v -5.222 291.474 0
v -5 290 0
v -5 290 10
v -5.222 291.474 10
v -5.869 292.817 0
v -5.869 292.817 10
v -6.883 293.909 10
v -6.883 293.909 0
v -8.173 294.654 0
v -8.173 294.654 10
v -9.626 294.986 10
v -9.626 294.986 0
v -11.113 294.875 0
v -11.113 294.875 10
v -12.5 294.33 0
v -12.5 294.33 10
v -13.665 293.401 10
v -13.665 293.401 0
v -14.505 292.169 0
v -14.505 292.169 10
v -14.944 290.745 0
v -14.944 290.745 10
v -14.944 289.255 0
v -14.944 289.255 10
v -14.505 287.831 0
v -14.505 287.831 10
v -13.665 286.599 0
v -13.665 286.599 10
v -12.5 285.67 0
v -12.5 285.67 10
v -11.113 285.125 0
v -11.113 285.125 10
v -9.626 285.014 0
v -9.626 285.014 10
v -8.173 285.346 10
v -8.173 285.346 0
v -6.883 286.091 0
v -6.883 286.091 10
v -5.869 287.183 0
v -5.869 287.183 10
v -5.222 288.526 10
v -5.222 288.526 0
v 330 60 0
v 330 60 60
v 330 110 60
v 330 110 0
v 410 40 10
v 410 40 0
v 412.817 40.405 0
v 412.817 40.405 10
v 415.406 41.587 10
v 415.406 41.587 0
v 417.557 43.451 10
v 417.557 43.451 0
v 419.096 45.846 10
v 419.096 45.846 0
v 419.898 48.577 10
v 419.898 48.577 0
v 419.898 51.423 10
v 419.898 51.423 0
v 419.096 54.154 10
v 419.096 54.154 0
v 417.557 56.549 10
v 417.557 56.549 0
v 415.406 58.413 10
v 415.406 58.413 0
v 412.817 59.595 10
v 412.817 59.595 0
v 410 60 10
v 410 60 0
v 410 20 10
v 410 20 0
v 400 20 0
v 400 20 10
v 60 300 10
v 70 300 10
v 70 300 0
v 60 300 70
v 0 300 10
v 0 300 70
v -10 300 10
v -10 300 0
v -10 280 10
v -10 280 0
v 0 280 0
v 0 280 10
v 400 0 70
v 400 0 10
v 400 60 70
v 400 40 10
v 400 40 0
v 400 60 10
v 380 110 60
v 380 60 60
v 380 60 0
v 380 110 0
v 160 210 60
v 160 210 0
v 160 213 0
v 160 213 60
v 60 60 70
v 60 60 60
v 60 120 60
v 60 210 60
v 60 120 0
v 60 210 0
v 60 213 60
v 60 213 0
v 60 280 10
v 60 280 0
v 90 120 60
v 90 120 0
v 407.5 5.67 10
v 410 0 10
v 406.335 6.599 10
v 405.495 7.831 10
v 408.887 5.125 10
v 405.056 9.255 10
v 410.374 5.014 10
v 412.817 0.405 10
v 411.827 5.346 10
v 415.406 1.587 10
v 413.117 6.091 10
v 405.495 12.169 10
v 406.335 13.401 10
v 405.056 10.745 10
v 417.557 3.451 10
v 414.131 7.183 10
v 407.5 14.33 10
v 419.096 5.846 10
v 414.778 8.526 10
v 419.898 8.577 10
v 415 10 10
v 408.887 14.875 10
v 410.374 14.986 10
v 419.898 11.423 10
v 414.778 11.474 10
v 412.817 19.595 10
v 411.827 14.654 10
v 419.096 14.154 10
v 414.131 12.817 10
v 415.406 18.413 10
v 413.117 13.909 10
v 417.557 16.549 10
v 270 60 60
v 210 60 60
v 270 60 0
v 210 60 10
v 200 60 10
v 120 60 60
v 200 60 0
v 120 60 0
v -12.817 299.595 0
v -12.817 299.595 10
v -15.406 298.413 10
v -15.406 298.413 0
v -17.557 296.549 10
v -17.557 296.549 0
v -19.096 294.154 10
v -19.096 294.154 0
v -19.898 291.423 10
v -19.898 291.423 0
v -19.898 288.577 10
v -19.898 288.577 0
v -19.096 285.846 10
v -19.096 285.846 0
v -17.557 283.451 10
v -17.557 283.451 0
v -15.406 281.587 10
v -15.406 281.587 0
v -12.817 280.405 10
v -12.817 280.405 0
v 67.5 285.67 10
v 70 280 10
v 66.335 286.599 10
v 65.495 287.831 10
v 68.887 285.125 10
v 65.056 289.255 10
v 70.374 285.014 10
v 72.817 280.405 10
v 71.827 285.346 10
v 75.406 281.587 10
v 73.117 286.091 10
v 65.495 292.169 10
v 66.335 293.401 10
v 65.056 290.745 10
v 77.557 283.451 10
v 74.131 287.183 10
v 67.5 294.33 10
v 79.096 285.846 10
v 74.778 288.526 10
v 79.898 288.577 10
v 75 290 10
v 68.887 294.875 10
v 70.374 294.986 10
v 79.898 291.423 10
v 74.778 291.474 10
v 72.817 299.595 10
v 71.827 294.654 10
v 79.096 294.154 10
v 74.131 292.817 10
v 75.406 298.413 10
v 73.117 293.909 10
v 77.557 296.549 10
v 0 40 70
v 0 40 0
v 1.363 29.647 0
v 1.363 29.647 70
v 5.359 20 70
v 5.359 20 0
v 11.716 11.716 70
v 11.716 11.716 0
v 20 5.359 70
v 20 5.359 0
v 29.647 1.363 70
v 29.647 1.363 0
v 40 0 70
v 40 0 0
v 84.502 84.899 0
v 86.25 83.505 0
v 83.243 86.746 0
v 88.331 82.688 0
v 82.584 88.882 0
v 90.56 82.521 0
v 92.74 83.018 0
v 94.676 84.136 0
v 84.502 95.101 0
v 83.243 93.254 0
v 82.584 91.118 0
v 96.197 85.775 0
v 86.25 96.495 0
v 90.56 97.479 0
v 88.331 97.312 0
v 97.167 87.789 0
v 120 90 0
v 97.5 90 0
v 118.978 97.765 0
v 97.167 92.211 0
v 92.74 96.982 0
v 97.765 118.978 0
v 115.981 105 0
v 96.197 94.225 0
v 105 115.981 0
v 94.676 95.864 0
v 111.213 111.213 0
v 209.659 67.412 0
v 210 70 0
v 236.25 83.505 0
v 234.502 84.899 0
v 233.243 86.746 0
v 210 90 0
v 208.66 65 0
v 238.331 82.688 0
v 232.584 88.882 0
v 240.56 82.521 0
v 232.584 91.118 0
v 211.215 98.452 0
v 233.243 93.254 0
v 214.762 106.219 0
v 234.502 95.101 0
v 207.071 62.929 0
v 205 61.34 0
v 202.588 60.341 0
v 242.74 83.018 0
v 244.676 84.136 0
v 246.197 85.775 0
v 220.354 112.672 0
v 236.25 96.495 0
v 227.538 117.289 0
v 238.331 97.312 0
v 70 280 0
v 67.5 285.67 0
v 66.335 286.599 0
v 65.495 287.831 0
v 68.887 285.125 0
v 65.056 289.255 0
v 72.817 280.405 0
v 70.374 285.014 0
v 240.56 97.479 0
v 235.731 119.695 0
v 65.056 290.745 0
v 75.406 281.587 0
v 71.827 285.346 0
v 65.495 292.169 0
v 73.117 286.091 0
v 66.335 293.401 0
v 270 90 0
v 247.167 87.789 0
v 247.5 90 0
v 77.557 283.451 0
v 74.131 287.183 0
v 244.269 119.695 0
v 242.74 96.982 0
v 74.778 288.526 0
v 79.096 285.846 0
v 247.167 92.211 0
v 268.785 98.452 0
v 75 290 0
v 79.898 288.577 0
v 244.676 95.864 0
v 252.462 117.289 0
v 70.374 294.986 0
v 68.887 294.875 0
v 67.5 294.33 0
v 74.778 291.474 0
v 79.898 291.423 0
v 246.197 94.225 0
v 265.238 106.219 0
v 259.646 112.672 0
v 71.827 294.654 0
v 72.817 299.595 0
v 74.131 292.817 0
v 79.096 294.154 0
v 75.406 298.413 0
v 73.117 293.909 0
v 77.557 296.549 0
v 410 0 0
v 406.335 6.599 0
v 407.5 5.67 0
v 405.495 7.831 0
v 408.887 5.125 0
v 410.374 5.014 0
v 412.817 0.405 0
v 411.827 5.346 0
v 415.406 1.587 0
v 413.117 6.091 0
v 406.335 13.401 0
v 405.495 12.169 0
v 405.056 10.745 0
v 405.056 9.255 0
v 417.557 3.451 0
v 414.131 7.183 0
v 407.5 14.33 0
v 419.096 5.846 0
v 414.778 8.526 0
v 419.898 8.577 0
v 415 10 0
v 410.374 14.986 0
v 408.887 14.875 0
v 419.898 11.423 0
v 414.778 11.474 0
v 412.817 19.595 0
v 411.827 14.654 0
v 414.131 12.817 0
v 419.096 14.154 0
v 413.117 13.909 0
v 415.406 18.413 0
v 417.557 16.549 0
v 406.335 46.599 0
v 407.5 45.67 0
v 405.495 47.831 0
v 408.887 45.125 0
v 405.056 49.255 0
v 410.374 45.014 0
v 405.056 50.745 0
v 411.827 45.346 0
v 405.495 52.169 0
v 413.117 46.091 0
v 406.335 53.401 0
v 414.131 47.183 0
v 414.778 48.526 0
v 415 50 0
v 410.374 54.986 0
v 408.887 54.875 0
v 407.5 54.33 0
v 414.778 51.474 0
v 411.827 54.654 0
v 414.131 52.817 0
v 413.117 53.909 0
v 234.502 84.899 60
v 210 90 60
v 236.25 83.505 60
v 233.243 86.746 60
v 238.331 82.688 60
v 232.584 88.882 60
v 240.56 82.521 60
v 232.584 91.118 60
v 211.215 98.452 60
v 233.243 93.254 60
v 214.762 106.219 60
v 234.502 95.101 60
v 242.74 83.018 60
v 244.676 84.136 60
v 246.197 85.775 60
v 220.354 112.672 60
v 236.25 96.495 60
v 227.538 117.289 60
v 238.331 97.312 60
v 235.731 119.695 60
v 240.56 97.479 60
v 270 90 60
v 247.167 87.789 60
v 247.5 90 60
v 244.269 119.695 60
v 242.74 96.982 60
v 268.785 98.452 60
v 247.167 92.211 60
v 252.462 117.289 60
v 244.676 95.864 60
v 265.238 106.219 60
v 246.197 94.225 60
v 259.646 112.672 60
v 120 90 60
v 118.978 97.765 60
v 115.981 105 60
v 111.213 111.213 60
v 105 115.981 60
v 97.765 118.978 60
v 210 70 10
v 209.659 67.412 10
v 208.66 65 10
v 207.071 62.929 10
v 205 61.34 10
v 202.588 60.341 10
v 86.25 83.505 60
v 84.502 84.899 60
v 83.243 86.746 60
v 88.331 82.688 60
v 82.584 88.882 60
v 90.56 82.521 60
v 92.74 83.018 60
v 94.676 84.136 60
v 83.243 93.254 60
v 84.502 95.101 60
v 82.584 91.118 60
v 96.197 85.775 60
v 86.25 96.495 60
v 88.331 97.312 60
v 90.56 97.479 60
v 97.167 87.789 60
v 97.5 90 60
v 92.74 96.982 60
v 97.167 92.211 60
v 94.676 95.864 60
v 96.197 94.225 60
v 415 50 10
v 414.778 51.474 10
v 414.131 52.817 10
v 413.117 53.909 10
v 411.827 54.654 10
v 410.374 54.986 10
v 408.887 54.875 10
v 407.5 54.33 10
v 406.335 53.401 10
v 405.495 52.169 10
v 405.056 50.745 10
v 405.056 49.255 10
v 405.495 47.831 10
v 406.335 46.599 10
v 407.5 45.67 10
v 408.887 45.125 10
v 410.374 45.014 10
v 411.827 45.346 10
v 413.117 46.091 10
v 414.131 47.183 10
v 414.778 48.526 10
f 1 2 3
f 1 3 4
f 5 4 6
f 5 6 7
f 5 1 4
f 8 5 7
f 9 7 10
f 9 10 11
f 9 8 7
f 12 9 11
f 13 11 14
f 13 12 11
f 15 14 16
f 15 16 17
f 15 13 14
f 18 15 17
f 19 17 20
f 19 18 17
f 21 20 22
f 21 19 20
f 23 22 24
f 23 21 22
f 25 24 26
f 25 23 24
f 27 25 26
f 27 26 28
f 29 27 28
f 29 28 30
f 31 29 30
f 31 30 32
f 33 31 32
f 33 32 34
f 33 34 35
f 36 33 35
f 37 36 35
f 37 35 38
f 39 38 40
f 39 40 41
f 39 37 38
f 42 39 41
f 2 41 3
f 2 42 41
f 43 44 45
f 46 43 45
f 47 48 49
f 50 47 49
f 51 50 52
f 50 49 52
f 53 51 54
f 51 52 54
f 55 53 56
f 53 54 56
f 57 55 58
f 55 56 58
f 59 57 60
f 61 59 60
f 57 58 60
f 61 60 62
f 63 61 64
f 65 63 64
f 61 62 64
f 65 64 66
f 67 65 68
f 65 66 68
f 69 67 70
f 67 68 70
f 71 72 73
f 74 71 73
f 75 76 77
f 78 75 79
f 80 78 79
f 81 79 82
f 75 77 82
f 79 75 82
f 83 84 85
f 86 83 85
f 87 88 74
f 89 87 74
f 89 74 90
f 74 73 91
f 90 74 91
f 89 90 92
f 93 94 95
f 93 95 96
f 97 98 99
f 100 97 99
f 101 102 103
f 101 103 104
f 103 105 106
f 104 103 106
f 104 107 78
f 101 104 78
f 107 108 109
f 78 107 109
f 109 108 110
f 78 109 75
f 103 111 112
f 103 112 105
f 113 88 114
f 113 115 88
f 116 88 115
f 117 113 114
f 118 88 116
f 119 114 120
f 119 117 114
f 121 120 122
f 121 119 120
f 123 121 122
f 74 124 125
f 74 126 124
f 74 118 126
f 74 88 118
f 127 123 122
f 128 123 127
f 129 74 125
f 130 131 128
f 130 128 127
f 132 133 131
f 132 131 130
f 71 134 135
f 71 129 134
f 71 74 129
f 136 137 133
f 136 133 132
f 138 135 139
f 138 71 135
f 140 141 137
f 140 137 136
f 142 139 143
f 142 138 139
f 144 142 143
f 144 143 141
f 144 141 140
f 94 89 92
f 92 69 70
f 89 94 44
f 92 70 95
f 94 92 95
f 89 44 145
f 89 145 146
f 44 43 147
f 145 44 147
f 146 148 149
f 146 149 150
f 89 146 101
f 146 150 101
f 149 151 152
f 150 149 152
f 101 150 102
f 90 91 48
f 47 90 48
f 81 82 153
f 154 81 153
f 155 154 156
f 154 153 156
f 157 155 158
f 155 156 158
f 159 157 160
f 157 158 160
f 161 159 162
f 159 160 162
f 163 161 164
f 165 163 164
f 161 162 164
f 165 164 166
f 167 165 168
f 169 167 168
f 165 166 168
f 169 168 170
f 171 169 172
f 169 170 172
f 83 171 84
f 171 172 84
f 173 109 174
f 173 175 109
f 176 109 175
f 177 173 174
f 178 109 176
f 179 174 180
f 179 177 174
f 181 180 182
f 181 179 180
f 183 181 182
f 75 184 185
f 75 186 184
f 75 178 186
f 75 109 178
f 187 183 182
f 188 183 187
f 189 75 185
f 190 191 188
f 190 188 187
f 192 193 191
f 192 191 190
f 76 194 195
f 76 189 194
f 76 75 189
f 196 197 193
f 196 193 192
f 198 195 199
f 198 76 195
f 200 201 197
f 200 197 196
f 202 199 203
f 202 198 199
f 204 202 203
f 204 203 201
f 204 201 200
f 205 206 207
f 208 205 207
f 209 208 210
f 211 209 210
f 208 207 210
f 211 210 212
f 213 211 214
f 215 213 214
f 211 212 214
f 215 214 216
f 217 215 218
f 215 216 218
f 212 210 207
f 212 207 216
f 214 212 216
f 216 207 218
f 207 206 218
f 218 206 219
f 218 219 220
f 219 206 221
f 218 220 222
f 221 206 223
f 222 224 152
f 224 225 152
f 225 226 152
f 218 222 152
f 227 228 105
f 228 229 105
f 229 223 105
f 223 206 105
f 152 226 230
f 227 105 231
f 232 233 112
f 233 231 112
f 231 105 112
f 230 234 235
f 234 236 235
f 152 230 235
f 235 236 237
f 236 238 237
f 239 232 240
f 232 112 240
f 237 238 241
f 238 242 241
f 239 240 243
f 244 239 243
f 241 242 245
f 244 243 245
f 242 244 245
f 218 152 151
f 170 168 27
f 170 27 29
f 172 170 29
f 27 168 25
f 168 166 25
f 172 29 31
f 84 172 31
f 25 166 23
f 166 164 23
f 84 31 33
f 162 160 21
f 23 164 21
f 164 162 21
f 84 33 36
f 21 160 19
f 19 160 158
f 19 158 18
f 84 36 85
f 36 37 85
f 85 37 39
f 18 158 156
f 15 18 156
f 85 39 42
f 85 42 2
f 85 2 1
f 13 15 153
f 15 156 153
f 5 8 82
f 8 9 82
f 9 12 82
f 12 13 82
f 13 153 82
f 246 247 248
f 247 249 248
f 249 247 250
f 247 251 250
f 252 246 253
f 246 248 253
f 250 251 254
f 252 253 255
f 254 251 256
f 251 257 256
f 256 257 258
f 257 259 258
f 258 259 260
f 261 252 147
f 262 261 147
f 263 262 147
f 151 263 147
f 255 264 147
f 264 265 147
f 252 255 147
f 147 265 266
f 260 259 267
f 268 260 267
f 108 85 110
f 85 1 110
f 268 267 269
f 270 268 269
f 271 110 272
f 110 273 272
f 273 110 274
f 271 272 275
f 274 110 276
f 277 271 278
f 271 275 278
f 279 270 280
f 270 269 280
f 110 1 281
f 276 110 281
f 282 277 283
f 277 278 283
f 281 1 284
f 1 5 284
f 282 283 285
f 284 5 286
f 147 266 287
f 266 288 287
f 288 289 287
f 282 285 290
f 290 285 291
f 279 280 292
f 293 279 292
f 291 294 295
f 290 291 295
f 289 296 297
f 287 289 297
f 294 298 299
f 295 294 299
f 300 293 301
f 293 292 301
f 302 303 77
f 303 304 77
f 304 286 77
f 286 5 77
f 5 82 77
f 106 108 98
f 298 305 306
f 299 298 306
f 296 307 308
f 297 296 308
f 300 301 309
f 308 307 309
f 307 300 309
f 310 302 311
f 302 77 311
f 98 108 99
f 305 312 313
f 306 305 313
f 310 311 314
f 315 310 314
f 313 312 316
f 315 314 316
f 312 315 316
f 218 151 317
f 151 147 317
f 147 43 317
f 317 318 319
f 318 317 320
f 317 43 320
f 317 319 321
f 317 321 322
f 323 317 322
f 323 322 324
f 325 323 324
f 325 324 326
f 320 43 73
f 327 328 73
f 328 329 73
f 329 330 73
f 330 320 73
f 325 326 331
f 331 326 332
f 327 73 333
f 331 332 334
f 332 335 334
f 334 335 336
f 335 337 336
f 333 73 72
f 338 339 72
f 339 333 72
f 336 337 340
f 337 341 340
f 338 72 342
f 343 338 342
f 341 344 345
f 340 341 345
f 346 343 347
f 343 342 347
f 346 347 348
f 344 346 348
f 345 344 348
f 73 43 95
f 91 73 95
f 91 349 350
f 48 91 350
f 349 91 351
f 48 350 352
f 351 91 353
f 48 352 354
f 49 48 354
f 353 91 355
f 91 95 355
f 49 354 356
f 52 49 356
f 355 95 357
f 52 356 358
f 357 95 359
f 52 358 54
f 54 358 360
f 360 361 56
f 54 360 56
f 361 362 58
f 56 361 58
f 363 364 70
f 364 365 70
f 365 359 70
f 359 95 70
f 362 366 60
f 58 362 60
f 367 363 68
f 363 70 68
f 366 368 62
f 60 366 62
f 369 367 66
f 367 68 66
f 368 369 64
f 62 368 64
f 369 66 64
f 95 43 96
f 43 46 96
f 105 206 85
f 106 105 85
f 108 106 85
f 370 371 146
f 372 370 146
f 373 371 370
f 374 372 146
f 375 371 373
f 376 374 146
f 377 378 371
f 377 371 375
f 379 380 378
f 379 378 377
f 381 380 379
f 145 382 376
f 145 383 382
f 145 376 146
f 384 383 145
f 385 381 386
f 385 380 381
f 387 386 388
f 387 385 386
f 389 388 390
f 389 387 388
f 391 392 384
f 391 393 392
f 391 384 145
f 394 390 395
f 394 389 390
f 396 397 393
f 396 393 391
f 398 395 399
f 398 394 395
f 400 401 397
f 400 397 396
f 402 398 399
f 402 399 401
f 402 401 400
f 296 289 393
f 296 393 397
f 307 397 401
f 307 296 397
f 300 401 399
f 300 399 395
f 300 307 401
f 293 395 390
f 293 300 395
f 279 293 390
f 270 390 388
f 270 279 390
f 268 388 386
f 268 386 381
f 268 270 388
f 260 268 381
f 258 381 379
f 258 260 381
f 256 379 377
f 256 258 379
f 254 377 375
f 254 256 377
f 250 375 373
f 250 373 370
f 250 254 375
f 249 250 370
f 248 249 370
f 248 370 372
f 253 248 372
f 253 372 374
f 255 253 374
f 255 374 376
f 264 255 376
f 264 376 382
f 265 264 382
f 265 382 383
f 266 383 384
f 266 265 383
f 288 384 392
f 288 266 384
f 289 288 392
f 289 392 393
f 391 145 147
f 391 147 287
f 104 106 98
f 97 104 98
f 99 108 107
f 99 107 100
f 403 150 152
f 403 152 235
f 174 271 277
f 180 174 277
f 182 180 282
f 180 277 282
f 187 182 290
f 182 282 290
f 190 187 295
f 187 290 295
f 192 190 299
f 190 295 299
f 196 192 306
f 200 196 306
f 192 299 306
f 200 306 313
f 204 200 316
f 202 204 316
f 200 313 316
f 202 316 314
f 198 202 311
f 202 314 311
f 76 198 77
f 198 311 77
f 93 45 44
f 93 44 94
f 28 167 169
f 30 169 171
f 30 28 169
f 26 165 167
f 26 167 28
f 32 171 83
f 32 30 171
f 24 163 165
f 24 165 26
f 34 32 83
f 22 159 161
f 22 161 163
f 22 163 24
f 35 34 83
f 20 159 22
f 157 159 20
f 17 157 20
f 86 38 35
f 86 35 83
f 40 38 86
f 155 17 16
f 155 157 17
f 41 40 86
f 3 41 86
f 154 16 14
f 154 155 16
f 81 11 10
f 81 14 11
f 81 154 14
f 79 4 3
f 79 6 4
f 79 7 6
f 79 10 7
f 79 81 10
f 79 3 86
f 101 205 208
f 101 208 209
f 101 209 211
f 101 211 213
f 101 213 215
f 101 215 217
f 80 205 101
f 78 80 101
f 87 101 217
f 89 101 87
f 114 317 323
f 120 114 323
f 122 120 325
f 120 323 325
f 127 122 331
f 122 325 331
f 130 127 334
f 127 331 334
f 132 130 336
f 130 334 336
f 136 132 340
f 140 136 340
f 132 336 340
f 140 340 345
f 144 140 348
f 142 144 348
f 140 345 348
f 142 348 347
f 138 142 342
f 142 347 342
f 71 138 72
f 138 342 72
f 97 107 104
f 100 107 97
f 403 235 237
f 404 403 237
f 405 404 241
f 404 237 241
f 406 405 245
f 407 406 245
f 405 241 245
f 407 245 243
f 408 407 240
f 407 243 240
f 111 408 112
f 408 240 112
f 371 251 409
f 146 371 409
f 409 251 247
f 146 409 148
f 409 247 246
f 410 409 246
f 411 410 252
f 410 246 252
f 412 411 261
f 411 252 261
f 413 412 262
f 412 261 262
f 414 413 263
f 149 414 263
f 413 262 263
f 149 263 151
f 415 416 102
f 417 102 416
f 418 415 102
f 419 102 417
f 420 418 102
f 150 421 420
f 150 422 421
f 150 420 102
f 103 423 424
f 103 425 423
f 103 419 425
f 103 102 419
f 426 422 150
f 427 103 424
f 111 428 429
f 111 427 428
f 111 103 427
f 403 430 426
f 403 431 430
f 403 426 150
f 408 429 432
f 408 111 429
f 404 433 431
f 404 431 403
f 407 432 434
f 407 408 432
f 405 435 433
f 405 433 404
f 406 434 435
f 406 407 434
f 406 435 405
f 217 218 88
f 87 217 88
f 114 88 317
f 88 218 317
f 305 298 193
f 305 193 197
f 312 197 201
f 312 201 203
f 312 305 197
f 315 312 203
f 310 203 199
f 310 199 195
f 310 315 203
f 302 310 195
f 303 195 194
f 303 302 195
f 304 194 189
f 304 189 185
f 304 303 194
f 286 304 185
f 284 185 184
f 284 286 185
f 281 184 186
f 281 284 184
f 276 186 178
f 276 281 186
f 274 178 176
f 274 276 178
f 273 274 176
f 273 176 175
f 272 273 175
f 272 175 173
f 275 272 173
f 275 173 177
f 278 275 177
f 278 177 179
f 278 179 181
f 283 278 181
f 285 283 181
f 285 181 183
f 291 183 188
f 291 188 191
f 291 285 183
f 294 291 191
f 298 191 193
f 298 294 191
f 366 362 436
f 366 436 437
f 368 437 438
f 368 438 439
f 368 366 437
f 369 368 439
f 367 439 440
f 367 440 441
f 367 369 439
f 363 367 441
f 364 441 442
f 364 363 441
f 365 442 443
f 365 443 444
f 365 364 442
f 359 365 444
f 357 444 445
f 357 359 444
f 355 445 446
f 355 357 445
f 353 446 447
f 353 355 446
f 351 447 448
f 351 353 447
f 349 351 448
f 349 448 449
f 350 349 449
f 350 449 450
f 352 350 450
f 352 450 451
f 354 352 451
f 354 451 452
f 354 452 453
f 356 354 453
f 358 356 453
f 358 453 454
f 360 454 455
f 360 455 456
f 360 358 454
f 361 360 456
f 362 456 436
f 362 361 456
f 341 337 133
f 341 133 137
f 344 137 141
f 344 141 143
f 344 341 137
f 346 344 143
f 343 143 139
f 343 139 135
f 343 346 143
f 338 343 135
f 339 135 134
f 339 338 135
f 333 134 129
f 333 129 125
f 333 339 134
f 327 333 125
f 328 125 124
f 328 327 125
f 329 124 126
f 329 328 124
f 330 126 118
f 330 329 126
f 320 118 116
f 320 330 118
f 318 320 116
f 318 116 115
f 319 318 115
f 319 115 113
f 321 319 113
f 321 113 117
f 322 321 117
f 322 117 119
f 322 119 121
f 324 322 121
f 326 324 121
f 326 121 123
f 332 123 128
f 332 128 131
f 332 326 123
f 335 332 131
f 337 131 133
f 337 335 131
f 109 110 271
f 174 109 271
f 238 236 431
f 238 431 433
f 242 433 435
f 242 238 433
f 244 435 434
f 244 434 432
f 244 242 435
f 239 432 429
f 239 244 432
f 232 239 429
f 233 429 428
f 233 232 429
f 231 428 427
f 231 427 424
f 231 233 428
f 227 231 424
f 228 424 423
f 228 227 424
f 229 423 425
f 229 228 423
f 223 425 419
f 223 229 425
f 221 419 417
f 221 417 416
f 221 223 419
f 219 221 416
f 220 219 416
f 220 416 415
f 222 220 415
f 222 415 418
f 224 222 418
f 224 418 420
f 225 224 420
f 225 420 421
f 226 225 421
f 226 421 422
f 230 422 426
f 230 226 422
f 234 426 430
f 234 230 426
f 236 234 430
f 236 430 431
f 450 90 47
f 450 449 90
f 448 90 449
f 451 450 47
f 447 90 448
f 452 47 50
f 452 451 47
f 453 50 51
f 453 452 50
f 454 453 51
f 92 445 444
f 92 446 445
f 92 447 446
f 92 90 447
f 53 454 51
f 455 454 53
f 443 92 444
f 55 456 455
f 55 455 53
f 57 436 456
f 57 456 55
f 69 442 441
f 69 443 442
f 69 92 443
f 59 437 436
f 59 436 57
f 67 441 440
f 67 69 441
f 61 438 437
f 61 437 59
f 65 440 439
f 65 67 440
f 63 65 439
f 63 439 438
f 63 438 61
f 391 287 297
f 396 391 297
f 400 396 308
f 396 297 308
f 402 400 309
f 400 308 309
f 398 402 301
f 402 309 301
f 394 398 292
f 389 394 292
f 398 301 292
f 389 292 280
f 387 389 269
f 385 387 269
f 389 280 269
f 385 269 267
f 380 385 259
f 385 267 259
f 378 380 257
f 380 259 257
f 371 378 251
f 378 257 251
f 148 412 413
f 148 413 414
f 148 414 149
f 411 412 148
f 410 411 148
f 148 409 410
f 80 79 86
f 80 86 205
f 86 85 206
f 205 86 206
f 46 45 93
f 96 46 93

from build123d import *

# Parameters (mm, degrees)
F1_DEPTH = 70
F0_R     = 7.5
F0_W     = 100
F0_H     = 3
F0_W_2   = 50
F0_H_2   = 50
F2_DEPTH = 60
F0_R_2   = 5
F3_DEPTH = 10


with BuildPart() as f1:
    # F0 (on Top) → F1 (new body)
    with BuildSketch(Plane.XY):
        with BuildLine():
            Line((0, 280), (0, 40))
            ThreePointArc((0, 40), (11.715729, 11.715729), (40, 0))
            Line((40, 0), (400, 0))
            Line((400, 0), (400, 20))
            Line((400, 20), (400, 40))
            Line((400, 40), (400, 60))
            Line((400, 60), (380, 60))
            Line((380, 60), (330, 60))
            Line((330, 60), (270, 60))
            Line((270, 60), (210, 60))
            Line((210, 60), (200, 60))
            Line((200, 60), (120, 60))
            Line((120, 60), (60, 60))
            Line((60, 60), (60, 120))
            Line((60, 120), (60, 210))
            Line((60, 210), (60, 213))
            Line((60, 213), (60, 280))
            Line((60, 280), (60, 300))
            Line((60, 300), (0, 300))
            Line((0, 300), (0, 280))
        make_face()
    extrude(amount=F1_DEPTH)

    # F0 (on Top) → F2 (join)
    with BuildSketch(Plane.XY):
        with BuildLine():
            Line((90, 120), (60, 120))
            Line((60, 120), (60, 60))
            Line((60, 60), (120, 60))
            Line((120, 60), (120, 90))
            ThreePointArc((120, 90), (111.213203, 111.213203), (90, 120))
        make_face()
        with Locations((90, 90)):
            Circle(F0_R, mode=Mode.SUBTRACT)
        with BuildLine():
            Line((210, 60), (270, 60))
            Line((270, 60), (270, 90))
            ThreePointArc((270, 90), (240, 120), (210, 90))
            Line((210, 90), (210, 70))
            Line((210, 70), (210, 60))
        make_face()
        with Locations((240, 90)):
            Circle(F0_R, mode=Mode.SUBTRACT)
        with Locations((110, 211.5)):
            Rectangle(F0_W, F0_H)
        with Locations((355, 85)):
            Rectangle(F0_W_2, F0_H_2)
    extrude(amount=F2_DEPTH)

    # F0 (on Top) → F3 (join)
    with BuildSketch(Plane.XY):
        with BuildLine():
            Line((200, 60), (210, 60))
            Line((210, 60), (210, 70))
            ThreePointArc((210, 70), (207.071068, 62.928932), (200, 60))
        make_face()
        with BuildLine():
            Line((400, 60), (400, 40))
            Line((400, 40), (410, 40))
            ThreePointArc((410, 40), (420, 50), (410, 60))
            Line((410, 60), (400, 60))
        make_face()
        with Locations((410, 50)):
            Circle(F0_R_2, mode=Mode.SUBTRACT)
        with BuildLine():
            Line((400, 20), (400, 0))
            Line((400, 0), (410, 0))
            ThreePointArc((410, 0), (420, 10), (410, 20))
            Line((410, 20), (400, 20))
        make_face()
        with Locations((410, 10)):
            Circle(F0_R_2, mode=Mode.SUBTRACT)
        with BuildLine():
            Line((70, 300), (60, 300))
            Line((60, 300), (60, 280))
            Line((60, 280), (70, 280))
            ThreePointArc((70, 280), (80, 290), (70, 300))
        make_face()
        with Locations((70, 290)):
            Circle(F0_R_2, mode=Mode.SUBTRACT)
        with BuildLine():
            Line((-10, 280), (0, 280))
            Line((0, 280), (0, 300))
            Line((0, 300), (-10, 300))
            ThreePointArc((-10, 300), (-20, 290), (-10, 280))
        make_face()
        with Locations((-10, 290)):
            Circle(F0_R_2, mode=Mode.SUBTRACT)
    extrude(amount=F3_DEPTH)


solid = f1.part
